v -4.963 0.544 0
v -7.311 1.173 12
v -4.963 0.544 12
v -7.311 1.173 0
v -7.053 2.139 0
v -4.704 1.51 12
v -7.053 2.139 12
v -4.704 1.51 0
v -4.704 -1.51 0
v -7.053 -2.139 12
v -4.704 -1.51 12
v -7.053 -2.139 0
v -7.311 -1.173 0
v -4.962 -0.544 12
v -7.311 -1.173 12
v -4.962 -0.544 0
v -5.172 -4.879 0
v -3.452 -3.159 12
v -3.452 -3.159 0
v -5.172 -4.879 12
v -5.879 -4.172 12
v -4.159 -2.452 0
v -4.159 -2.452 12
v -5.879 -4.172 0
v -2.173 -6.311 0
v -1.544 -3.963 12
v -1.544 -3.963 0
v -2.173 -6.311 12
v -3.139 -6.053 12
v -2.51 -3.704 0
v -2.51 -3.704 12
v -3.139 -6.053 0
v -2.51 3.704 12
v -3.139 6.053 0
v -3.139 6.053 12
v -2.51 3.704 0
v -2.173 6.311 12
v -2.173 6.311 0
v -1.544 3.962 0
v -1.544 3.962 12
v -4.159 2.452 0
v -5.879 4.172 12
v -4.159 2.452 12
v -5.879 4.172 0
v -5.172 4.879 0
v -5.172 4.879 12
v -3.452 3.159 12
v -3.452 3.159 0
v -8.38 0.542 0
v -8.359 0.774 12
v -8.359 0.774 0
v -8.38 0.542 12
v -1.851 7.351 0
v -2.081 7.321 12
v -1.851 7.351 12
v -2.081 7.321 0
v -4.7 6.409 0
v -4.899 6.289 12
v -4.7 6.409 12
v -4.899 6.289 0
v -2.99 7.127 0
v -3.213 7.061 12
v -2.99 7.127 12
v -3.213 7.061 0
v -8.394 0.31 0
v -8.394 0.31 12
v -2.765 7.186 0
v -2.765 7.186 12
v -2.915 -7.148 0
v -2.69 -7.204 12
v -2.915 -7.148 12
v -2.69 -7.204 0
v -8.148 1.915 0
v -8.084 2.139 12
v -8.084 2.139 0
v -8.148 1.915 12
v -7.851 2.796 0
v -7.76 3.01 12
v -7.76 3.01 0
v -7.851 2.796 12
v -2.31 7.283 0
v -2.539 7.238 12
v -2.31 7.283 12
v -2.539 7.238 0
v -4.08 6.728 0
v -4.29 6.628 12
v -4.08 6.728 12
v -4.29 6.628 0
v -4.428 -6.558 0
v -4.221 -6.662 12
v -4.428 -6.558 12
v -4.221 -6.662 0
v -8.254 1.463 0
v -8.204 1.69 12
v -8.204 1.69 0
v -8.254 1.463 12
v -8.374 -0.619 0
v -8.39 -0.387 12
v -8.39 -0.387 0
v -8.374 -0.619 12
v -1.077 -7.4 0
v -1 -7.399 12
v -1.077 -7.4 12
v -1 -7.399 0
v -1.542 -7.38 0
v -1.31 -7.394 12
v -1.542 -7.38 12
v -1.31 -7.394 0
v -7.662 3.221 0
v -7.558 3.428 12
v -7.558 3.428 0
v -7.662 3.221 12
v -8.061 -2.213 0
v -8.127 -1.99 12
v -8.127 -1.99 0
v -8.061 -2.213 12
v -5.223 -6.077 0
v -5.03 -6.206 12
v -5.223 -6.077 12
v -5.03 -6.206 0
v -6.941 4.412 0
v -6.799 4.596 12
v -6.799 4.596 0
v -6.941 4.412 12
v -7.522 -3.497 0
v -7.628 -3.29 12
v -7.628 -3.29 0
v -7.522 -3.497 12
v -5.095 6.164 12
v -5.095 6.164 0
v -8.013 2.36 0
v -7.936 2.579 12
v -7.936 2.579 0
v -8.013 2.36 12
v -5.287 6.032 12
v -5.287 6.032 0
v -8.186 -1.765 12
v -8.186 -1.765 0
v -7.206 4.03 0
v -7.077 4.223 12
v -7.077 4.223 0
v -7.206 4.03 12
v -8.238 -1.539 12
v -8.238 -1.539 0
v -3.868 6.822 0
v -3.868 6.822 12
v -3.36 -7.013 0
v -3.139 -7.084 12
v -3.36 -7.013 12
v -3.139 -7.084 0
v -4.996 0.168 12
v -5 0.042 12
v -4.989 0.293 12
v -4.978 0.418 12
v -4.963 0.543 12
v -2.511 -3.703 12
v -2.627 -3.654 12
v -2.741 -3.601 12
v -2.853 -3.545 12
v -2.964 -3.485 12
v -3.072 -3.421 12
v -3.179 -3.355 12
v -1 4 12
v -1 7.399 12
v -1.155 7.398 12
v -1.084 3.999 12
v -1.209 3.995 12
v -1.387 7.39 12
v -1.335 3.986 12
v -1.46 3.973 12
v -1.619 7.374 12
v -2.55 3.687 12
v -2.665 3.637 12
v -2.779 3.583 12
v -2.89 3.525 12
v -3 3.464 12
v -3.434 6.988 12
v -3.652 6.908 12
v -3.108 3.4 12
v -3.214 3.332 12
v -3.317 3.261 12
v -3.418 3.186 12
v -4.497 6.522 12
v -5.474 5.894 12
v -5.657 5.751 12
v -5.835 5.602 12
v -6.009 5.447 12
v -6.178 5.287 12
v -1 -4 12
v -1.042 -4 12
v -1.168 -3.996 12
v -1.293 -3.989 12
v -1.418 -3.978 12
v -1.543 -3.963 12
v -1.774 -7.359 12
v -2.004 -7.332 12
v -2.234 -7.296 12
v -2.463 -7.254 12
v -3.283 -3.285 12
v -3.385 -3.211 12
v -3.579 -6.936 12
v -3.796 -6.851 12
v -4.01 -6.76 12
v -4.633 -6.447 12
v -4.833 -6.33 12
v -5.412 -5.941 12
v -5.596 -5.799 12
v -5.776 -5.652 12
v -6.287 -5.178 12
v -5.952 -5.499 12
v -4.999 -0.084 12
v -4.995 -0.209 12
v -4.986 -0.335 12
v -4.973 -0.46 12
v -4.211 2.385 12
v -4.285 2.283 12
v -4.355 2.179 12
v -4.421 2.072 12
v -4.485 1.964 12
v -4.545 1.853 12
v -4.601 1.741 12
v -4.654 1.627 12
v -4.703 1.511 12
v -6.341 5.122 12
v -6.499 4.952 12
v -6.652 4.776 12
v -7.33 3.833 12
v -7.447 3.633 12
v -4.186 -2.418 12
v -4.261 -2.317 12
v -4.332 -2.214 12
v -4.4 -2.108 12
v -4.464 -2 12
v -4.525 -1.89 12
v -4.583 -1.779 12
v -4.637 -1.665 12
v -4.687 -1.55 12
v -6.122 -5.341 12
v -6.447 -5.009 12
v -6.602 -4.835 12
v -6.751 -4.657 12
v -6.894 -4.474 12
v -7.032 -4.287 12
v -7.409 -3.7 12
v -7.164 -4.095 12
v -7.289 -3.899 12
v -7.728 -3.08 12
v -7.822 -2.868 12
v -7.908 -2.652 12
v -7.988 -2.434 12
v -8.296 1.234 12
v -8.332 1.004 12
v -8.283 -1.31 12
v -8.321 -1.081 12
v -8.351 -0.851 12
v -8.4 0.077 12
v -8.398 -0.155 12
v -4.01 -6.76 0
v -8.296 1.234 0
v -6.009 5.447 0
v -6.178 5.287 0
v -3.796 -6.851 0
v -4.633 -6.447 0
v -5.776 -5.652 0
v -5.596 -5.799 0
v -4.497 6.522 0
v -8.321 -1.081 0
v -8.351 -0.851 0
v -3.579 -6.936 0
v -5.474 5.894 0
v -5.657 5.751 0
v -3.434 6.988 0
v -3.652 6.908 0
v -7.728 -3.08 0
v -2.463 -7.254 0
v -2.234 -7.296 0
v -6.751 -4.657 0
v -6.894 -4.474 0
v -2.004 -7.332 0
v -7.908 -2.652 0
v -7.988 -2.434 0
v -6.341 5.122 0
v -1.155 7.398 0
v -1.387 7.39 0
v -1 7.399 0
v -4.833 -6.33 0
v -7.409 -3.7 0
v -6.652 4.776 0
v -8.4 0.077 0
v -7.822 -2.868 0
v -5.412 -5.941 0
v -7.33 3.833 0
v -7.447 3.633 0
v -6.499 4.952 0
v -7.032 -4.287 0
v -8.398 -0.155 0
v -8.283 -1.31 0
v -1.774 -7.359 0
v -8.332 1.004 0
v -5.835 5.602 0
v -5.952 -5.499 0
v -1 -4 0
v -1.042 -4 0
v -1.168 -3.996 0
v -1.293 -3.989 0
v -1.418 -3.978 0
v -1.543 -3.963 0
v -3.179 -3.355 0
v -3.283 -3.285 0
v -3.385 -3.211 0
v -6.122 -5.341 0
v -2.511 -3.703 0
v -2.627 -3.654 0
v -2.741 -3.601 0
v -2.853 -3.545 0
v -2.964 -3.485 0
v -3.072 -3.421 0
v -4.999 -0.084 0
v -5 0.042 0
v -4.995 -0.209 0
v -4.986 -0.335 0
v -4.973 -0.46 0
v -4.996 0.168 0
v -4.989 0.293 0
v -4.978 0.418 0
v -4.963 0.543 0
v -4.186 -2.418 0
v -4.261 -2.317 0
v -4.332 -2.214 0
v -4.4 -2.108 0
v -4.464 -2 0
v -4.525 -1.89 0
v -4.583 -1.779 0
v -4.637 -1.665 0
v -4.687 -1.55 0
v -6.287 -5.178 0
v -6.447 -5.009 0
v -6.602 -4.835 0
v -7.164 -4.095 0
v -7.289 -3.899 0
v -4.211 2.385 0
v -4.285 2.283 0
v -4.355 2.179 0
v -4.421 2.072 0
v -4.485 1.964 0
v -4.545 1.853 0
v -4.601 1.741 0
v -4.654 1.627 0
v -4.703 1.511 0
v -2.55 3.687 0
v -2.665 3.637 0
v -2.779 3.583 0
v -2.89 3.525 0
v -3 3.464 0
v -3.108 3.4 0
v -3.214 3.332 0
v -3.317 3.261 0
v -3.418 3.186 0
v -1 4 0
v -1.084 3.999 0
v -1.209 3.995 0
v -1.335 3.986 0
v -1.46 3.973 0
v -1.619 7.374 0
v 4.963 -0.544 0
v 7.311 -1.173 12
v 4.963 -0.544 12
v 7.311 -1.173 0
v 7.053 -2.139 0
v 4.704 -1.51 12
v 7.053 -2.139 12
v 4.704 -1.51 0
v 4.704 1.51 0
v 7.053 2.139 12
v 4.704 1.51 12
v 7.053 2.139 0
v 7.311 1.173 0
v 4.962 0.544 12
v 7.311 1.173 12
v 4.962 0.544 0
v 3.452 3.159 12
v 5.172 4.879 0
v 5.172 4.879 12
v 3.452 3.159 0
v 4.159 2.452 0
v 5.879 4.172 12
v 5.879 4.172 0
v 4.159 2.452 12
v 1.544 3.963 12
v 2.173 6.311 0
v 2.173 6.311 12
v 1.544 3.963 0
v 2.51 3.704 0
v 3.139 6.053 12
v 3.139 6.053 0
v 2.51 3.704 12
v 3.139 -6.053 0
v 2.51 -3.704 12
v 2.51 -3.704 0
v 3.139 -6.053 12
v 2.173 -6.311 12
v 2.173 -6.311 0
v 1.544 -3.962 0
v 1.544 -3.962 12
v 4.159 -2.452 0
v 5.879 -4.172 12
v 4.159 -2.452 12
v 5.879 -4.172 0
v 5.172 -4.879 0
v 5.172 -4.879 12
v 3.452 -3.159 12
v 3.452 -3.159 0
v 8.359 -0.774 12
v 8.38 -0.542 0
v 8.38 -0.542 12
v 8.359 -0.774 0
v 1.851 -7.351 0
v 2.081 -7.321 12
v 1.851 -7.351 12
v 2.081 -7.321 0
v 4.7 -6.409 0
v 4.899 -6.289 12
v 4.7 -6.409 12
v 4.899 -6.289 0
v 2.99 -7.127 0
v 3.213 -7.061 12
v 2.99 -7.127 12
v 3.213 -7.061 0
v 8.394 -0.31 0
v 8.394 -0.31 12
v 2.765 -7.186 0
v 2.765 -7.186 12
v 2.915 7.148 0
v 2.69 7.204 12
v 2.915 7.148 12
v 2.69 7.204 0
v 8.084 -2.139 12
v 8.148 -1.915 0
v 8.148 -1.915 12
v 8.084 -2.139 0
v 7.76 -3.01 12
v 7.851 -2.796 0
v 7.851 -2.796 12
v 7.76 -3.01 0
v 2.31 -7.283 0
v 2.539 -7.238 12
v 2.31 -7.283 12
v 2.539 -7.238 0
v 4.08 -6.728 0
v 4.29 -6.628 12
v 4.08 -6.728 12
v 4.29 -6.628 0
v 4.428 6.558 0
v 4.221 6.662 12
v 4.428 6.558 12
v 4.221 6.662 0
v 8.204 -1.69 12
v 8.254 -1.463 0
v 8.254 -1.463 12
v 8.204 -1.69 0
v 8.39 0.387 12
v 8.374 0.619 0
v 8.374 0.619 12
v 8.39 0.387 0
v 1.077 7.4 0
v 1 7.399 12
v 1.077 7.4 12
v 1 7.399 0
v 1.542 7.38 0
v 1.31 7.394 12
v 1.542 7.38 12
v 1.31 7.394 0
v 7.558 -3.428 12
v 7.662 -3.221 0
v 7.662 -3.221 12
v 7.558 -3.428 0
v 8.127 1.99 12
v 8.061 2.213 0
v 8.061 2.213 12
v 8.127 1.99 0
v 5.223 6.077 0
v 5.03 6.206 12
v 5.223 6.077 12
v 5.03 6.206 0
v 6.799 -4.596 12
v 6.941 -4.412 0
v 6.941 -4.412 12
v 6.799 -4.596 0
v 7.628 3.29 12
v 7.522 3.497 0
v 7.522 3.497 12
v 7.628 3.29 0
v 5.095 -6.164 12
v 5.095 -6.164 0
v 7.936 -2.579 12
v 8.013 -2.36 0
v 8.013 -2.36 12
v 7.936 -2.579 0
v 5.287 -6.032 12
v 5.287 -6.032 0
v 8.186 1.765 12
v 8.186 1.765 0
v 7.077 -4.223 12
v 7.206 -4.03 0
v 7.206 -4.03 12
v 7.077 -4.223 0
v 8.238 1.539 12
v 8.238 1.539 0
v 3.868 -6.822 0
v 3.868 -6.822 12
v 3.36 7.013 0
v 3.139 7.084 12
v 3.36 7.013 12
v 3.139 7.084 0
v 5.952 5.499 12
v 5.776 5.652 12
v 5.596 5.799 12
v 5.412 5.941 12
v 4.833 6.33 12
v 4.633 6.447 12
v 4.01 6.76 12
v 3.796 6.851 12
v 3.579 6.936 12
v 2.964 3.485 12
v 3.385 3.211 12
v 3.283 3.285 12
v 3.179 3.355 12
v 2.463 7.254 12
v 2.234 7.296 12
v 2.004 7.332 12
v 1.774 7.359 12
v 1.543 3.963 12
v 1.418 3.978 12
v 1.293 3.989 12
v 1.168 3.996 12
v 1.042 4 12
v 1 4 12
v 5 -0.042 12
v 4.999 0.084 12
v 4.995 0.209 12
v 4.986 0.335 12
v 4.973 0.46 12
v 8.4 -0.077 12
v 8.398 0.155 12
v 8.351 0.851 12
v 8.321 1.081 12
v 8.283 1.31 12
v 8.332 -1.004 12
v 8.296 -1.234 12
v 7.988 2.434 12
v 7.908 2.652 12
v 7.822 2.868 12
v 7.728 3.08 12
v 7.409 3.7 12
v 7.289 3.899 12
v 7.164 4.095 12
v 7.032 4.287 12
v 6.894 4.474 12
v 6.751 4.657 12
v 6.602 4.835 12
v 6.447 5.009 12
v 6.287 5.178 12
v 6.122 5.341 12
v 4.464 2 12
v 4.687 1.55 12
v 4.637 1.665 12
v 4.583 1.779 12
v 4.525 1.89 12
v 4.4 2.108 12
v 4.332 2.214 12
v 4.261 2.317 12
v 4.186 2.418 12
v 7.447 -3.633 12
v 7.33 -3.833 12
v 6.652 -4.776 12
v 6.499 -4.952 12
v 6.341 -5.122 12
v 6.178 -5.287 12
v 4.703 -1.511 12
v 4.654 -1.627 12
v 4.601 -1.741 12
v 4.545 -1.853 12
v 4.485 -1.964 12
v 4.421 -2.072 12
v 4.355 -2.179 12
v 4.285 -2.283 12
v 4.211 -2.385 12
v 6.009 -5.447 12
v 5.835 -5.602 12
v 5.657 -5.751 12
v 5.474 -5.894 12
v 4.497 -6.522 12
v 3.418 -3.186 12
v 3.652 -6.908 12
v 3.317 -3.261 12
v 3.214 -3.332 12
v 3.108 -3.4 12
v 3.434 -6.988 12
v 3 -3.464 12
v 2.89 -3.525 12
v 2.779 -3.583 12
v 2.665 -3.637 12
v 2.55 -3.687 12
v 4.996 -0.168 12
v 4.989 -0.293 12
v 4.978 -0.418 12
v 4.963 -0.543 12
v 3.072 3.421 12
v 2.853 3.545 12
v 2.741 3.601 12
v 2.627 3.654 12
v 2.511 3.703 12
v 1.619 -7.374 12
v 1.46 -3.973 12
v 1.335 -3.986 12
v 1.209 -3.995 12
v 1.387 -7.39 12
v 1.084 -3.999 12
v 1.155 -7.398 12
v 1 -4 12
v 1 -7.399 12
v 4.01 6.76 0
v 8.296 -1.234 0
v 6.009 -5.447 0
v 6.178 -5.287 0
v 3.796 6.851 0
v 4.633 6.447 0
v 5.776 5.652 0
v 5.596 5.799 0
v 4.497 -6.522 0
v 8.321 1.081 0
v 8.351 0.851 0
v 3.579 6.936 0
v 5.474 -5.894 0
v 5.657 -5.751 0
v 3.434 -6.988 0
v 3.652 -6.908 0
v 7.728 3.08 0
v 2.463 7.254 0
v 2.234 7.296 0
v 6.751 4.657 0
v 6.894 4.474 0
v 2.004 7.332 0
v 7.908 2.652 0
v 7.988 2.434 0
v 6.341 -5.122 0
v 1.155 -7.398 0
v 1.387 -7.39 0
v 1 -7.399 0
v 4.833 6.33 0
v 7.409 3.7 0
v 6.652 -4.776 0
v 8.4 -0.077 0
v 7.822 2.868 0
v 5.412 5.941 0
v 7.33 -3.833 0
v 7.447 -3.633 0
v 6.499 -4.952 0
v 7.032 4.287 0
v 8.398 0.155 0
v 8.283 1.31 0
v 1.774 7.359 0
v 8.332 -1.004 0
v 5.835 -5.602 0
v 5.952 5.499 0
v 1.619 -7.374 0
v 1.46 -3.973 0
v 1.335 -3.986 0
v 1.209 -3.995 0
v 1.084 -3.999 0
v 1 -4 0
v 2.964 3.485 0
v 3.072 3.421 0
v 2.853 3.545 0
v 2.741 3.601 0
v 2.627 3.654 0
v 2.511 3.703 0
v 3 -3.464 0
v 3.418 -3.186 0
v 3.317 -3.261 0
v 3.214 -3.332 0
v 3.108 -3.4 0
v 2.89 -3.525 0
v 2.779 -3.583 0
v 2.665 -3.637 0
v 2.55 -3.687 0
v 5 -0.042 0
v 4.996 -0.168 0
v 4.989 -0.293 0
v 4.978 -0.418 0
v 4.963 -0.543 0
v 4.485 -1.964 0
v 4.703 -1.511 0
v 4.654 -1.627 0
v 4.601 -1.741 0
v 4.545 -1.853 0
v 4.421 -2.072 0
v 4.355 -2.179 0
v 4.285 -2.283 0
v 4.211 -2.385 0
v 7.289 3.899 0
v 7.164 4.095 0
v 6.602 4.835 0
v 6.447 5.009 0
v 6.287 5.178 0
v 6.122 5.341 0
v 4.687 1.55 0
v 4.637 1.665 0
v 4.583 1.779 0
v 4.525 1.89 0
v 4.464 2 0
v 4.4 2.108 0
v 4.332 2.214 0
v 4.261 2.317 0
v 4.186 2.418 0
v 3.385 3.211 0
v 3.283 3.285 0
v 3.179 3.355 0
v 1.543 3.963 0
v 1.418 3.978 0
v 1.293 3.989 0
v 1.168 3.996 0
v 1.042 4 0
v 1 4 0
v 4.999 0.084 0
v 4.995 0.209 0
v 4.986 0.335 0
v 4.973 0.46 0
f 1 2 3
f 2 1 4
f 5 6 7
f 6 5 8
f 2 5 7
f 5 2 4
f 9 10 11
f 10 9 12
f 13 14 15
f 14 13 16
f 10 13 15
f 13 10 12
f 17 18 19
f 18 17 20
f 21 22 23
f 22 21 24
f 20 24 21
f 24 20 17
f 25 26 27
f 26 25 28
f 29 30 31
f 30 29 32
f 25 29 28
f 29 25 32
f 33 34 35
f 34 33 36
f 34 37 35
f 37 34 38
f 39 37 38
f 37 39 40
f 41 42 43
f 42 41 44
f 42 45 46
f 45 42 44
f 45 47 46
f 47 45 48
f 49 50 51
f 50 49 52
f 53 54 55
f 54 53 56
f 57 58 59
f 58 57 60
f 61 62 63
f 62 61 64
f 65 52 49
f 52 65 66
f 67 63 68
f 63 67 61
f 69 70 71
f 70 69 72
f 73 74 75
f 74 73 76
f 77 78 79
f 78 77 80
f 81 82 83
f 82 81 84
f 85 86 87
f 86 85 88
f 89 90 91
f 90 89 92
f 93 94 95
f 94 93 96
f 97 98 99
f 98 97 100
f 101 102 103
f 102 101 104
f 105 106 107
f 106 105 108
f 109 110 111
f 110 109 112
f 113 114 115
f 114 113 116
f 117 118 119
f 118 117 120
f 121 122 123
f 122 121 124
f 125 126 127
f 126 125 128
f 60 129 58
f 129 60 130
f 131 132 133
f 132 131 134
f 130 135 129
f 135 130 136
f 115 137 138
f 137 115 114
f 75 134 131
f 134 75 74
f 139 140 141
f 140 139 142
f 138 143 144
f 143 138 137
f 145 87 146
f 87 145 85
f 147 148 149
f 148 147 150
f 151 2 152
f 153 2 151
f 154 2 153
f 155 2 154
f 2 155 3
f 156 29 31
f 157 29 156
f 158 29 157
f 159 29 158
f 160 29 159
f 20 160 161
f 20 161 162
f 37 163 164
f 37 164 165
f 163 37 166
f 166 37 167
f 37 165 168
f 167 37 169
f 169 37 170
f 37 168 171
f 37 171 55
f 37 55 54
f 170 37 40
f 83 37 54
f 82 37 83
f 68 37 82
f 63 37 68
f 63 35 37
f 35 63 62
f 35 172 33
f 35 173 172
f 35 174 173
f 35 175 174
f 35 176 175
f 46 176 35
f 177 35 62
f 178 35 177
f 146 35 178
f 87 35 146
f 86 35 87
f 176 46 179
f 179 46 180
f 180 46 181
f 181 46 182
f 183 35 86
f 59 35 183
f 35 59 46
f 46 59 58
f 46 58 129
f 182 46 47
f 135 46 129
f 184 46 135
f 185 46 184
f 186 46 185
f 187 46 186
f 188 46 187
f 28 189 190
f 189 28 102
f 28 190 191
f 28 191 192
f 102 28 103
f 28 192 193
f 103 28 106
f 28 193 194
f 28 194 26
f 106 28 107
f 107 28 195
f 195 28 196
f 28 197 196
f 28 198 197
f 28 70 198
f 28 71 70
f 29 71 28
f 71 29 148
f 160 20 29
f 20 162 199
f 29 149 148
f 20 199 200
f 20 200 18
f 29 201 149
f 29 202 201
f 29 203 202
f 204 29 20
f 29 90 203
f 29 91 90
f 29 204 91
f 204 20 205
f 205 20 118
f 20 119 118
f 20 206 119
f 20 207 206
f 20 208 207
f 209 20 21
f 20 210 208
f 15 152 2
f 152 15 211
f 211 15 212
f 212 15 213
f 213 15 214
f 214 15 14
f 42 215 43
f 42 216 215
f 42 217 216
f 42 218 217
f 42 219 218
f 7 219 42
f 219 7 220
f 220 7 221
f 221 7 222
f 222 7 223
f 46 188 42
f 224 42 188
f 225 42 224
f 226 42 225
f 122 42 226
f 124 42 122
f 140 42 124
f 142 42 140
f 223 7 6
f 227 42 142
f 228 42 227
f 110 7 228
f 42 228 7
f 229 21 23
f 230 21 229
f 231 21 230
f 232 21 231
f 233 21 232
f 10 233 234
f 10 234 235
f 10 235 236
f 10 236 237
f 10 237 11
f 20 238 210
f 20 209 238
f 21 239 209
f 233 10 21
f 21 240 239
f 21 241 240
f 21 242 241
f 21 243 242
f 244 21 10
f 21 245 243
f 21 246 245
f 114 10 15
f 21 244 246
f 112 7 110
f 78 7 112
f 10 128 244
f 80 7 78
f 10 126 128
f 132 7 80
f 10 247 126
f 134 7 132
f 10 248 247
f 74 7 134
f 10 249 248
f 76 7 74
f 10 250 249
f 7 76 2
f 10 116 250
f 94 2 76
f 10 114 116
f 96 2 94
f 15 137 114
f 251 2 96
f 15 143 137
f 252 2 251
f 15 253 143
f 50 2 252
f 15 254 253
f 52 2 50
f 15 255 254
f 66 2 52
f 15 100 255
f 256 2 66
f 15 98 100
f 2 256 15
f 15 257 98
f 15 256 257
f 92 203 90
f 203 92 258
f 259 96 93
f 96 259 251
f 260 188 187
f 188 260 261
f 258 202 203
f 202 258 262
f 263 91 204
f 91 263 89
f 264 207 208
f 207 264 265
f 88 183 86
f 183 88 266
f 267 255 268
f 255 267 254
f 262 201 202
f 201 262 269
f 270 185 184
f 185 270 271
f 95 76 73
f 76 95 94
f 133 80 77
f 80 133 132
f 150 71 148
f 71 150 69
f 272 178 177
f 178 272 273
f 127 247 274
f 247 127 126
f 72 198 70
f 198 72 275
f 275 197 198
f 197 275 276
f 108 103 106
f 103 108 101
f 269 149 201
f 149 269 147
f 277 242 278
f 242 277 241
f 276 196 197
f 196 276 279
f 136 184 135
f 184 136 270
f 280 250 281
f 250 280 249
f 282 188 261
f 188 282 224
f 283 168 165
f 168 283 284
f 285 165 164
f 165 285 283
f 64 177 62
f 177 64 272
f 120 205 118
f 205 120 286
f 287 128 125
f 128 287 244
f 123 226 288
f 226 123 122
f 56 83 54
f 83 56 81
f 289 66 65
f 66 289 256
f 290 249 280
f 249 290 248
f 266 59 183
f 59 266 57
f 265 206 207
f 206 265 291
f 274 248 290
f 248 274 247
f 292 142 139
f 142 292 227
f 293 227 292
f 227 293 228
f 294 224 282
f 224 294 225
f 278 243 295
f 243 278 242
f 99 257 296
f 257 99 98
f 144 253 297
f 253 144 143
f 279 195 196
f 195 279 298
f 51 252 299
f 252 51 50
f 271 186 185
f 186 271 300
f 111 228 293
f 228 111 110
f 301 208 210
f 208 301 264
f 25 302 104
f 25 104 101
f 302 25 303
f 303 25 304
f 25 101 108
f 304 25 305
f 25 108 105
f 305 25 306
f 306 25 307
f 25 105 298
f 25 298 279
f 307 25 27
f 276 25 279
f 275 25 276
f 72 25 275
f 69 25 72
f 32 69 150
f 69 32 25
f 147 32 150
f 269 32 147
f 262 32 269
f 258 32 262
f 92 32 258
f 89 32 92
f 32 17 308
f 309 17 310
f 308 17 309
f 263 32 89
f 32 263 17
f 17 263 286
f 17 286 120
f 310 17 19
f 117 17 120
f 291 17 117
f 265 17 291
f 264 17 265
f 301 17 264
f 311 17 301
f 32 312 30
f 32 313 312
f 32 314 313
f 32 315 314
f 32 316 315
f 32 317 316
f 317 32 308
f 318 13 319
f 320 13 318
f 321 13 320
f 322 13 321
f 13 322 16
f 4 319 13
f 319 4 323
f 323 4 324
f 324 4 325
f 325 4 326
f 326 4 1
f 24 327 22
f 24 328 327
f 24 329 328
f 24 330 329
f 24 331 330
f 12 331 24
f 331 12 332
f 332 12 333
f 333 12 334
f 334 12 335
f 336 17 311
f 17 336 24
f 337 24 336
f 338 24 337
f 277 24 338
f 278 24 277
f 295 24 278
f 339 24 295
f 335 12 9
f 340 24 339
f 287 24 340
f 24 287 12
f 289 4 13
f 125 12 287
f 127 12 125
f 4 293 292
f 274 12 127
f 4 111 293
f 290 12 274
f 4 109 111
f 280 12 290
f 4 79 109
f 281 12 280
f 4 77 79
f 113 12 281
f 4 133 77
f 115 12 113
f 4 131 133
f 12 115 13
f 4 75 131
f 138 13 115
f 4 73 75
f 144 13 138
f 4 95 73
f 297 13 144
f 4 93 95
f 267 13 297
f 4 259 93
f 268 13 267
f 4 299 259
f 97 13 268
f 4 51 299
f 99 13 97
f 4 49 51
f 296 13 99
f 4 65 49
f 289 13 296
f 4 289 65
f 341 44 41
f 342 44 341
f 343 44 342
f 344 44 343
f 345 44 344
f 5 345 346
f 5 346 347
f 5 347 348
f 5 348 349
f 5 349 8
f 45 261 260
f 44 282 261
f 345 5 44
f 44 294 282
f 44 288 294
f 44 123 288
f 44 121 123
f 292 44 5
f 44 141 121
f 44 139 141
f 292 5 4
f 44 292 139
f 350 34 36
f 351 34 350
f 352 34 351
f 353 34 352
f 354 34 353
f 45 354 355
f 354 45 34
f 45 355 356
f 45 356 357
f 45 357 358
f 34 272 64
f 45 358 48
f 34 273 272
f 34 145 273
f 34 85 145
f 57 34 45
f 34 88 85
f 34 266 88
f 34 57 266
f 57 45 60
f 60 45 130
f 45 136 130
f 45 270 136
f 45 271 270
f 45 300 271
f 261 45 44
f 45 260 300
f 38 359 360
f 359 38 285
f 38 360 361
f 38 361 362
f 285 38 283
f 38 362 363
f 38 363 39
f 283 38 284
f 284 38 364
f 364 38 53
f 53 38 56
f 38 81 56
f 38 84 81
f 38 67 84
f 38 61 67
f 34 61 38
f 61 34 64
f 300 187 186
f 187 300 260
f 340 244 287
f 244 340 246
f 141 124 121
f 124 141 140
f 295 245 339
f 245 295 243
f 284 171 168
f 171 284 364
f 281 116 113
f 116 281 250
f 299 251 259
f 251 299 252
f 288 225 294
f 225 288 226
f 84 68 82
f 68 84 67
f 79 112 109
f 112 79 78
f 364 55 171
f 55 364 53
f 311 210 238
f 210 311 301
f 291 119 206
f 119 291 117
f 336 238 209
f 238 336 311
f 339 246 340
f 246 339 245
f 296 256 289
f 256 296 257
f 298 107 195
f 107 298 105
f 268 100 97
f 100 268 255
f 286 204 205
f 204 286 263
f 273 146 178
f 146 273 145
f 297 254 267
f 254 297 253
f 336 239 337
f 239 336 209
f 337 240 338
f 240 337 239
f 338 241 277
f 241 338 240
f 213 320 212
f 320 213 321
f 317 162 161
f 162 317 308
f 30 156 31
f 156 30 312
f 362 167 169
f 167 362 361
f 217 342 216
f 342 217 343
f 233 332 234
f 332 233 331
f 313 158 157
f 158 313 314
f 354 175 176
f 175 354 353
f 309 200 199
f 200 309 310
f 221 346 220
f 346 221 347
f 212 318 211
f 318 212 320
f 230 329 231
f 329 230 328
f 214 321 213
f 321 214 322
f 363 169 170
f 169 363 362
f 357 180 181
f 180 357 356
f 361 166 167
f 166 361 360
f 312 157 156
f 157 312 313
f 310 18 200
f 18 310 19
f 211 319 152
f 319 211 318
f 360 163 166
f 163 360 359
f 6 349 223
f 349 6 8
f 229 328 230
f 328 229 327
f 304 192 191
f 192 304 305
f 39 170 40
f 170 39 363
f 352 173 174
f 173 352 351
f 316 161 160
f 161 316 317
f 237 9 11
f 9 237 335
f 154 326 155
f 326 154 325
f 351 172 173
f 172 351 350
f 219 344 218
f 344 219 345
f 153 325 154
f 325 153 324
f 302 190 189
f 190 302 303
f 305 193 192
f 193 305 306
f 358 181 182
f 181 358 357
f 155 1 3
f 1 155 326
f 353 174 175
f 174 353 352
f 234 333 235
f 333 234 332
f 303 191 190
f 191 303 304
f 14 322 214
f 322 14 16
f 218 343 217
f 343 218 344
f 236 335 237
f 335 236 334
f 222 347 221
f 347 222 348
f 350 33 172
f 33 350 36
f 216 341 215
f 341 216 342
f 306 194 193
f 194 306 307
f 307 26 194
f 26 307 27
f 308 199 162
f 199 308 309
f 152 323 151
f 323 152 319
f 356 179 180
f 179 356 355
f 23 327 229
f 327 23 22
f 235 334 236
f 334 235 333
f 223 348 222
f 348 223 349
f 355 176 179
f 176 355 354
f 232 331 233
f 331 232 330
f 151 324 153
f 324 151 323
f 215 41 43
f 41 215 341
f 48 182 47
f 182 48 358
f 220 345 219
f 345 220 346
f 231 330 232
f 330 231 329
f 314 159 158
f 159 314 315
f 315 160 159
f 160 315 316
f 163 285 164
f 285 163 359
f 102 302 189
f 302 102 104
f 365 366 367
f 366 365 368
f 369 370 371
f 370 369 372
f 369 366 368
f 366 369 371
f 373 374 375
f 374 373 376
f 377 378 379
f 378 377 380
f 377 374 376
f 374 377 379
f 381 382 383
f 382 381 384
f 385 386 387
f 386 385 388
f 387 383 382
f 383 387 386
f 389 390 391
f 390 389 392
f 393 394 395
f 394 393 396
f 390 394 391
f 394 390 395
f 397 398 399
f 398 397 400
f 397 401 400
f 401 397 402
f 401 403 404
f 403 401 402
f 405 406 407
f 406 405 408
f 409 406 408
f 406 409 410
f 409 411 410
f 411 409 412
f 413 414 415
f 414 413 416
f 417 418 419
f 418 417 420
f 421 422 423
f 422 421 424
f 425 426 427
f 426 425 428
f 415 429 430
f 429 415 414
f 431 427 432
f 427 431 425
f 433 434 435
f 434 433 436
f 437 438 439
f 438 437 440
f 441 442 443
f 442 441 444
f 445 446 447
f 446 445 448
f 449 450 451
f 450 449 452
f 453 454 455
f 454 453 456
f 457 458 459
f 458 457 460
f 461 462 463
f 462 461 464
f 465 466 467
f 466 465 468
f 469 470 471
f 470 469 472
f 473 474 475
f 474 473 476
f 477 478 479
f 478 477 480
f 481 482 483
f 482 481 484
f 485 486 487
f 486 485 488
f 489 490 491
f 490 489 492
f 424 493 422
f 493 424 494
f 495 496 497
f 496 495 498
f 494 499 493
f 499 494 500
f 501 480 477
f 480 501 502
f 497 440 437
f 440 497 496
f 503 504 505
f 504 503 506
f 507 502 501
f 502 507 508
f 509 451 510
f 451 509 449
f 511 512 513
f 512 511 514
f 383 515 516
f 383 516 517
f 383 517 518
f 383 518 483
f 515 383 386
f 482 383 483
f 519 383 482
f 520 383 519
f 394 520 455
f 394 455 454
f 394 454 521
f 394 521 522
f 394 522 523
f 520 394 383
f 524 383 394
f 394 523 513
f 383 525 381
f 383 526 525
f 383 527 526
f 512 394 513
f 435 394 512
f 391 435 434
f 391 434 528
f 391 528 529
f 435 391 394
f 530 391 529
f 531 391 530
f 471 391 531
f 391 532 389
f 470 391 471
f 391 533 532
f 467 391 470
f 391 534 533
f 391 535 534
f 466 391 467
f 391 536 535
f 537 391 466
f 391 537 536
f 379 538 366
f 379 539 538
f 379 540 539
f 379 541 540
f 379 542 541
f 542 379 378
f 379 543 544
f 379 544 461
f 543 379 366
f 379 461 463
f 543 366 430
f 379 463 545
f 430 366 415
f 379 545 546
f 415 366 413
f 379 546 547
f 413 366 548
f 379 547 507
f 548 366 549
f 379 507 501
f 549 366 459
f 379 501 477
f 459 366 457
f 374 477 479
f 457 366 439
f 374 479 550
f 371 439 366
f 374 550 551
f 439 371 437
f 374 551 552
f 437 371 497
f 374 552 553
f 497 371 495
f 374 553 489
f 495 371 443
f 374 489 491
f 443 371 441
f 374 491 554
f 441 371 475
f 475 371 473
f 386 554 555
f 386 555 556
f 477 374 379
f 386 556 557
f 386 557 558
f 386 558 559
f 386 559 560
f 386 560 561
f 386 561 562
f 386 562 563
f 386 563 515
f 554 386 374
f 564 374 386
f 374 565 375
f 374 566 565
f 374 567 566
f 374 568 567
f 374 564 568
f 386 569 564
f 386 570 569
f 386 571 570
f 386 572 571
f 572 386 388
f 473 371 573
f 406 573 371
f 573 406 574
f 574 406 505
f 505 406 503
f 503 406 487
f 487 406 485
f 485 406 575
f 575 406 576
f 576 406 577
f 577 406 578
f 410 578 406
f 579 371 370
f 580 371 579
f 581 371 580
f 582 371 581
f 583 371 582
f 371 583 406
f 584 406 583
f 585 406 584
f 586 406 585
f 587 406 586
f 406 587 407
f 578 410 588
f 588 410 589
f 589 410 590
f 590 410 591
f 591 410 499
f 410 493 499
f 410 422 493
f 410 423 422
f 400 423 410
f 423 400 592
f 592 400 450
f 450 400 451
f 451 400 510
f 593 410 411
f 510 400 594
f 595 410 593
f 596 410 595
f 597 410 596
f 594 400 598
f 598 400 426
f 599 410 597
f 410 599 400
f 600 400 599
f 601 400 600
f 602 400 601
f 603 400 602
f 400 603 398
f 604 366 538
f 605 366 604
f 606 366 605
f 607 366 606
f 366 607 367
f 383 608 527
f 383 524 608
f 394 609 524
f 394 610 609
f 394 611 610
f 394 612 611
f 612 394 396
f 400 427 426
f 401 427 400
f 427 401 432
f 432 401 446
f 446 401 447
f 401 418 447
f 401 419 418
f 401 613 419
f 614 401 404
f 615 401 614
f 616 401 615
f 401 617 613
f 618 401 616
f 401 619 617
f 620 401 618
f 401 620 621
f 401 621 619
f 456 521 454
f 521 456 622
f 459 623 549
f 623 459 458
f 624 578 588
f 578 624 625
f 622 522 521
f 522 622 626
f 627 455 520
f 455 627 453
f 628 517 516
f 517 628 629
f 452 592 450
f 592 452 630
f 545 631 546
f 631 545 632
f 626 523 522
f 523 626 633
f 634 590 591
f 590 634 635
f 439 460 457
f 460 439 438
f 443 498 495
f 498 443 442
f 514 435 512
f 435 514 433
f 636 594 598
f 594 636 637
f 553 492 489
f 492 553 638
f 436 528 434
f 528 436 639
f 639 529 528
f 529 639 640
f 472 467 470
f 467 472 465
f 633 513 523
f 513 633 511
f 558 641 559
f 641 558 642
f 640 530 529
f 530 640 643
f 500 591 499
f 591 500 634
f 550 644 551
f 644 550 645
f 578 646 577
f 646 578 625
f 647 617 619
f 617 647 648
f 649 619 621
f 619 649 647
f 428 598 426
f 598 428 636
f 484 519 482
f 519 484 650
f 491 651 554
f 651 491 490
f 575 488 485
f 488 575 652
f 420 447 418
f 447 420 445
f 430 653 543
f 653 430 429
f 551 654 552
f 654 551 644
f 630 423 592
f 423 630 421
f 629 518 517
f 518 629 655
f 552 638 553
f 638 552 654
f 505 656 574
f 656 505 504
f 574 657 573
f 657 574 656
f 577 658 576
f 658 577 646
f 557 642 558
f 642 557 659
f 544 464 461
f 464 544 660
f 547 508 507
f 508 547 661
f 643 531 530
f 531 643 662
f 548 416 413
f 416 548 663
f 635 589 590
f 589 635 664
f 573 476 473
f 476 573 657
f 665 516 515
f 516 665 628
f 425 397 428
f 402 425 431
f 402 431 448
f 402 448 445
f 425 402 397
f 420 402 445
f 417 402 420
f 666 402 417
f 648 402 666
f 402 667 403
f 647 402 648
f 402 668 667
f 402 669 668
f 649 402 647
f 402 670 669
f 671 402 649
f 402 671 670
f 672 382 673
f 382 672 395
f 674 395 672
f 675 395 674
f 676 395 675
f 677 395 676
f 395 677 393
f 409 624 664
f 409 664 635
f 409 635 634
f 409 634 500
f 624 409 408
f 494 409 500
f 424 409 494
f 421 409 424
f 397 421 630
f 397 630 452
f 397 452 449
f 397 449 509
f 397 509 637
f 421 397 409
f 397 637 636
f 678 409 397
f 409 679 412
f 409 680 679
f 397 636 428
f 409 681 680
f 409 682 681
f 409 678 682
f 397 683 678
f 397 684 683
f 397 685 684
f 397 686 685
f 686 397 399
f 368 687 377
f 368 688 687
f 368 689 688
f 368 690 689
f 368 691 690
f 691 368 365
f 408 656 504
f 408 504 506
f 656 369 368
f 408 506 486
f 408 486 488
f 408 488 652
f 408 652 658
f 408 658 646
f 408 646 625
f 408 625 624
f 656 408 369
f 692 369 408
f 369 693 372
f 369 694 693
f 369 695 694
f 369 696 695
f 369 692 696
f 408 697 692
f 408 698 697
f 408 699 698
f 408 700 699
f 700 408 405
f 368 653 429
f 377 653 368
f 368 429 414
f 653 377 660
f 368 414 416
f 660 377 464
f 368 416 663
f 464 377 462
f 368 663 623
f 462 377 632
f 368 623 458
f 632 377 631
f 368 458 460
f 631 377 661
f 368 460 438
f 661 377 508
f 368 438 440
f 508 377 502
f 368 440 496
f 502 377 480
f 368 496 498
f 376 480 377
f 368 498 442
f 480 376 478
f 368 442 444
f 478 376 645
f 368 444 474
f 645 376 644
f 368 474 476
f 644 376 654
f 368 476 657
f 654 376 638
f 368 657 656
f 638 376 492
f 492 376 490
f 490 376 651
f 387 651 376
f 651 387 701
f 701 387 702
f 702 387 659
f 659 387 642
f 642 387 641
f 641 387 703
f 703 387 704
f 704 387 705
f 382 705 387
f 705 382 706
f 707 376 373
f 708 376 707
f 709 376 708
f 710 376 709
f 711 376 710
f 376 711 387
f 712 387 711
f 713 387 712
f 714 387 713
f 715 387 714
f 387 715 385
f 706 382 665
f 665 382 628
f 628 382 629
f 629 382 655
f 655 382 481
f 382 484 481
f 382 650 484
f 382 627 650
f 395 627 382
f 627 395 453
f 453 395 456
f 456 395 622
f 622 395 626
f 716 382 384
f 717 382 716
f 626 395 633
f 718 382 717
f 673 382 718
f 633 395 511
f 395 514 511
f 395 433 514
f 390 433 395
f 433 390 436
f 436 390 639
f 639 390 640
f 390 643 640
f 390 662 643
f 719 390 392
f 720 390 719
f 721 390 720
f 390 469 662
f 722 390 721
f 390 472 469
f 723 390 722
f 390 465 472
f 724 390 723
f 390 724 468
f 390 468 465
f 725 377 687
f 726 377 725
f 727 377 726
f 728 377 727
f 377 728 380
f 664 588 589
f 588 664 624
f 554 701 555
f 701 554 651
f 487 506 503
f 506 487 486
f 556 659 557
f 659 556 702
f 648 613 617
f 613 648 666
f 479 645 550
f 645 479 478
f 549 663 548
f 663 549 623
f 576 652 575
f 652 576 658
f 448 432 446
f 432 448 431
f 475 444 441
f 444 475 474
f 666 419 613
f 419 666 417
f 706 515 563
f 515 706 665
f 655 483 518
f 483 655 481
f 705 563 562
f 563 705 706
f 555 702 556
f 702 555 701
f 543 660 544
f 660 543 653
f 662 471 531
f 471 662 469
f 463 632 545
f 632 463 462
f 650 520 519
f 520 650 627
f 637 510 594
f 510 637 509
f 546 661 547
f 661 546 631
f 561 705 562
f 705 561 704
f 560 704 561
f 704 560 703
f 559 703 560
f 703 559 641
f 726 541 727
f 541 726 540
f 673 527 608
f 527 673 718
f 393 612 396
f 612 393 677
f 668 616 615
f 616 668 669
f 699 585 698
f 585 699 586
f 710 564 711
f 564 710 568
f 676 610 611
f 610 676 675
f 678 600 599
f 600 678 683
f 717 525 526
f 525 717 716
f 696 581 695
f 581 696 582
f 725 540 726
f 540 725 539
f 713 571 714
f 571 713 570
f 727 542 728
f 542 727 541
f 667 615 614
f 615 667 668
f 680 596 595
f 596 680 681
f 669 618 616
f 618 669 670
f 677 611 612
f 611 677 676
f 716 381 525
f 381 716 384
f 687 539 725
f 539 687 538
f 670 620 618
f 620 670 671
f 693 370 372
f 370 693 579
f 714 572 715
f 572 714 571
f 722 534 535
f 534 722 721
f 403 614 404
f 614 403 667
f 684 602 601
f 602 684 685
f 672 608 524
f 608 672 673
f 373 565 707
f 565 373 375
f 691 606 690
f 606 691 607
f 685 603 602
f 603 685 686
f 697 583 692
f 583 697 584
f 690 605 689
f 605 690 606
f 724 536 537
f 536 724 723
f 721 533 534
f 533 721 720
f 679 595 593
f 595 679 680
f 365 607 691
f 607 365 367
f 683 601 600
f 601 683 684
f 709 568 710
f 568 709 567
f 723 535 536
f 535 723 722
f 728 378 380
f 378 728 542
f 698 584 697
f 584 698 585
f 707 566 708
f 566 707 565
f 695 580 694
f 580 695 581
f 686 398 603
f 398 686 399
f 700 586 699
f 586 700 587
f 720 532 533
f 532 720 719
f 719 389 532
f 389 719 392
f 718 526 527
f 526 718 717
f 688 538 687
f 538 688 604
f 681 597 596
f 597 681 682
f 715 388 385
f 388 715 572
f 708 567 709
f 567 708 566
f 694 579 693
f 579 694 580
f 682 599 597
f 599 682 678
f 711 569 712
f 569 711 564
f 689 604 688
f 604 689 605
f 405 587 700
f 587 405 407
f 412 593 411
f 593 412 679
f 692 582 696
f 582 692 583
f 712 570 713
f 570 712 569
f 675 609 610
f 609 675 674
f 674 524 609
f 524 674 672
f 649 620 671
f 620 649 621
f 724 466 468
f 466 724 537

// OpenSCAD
/* [Linear Bearing] */

// Outer Diameter (mm)
outer_diameter = 14.8;
outer_radius = outer_diameter / 2;

// Inner Diameter (mm)
inner_diameter = 8;
inner_radius = inner_diameter / 2;

// Sidewall Thickness (mm)
sidewall_thickness = 2;

// Height (mm)
height = 12; 

// Split Bearing?
split_bearing = "Yes";  // [Yes,No]

/* [Hidden] */
resolution = 200;
fudge = .1;

module half_bearing() {
	rotate([0,0,-15]) 
	difference() {
		cylinder(r = outer_radius, h = height, $fn = resolution);
	
		translate([0,0,-fudge])
		cylinder(r = inner_radius, h = height + fudge * 2, $fn = resolution);
		
		for (r = [-90, -60, -30, 0, 30, 60, 90]) 
			rotate([0,0,r]) 
			translate([0,0,height/2 - fudge]) 
			cube([inner_radius/4,outer_radius * 2 - sidewall_thickness,height + fudge * 4], center = true);
	
		rotate([0,0,15]) 
		translate([0,-outer_radius * 1.1,-fudge]) 
		cube([outer_radius,outer_radius * 2.2,height + fudge * 4]);
	}
}

if (split_bearing == "Yes") {
	translate([-1,0,0])
	half_bearing();
	translate([1,0,0])
	rotate([0,0,180])
	half_bearing();
} else {
	half_bearing();
	rotate([0,0,180])
	half_bearing();
}
